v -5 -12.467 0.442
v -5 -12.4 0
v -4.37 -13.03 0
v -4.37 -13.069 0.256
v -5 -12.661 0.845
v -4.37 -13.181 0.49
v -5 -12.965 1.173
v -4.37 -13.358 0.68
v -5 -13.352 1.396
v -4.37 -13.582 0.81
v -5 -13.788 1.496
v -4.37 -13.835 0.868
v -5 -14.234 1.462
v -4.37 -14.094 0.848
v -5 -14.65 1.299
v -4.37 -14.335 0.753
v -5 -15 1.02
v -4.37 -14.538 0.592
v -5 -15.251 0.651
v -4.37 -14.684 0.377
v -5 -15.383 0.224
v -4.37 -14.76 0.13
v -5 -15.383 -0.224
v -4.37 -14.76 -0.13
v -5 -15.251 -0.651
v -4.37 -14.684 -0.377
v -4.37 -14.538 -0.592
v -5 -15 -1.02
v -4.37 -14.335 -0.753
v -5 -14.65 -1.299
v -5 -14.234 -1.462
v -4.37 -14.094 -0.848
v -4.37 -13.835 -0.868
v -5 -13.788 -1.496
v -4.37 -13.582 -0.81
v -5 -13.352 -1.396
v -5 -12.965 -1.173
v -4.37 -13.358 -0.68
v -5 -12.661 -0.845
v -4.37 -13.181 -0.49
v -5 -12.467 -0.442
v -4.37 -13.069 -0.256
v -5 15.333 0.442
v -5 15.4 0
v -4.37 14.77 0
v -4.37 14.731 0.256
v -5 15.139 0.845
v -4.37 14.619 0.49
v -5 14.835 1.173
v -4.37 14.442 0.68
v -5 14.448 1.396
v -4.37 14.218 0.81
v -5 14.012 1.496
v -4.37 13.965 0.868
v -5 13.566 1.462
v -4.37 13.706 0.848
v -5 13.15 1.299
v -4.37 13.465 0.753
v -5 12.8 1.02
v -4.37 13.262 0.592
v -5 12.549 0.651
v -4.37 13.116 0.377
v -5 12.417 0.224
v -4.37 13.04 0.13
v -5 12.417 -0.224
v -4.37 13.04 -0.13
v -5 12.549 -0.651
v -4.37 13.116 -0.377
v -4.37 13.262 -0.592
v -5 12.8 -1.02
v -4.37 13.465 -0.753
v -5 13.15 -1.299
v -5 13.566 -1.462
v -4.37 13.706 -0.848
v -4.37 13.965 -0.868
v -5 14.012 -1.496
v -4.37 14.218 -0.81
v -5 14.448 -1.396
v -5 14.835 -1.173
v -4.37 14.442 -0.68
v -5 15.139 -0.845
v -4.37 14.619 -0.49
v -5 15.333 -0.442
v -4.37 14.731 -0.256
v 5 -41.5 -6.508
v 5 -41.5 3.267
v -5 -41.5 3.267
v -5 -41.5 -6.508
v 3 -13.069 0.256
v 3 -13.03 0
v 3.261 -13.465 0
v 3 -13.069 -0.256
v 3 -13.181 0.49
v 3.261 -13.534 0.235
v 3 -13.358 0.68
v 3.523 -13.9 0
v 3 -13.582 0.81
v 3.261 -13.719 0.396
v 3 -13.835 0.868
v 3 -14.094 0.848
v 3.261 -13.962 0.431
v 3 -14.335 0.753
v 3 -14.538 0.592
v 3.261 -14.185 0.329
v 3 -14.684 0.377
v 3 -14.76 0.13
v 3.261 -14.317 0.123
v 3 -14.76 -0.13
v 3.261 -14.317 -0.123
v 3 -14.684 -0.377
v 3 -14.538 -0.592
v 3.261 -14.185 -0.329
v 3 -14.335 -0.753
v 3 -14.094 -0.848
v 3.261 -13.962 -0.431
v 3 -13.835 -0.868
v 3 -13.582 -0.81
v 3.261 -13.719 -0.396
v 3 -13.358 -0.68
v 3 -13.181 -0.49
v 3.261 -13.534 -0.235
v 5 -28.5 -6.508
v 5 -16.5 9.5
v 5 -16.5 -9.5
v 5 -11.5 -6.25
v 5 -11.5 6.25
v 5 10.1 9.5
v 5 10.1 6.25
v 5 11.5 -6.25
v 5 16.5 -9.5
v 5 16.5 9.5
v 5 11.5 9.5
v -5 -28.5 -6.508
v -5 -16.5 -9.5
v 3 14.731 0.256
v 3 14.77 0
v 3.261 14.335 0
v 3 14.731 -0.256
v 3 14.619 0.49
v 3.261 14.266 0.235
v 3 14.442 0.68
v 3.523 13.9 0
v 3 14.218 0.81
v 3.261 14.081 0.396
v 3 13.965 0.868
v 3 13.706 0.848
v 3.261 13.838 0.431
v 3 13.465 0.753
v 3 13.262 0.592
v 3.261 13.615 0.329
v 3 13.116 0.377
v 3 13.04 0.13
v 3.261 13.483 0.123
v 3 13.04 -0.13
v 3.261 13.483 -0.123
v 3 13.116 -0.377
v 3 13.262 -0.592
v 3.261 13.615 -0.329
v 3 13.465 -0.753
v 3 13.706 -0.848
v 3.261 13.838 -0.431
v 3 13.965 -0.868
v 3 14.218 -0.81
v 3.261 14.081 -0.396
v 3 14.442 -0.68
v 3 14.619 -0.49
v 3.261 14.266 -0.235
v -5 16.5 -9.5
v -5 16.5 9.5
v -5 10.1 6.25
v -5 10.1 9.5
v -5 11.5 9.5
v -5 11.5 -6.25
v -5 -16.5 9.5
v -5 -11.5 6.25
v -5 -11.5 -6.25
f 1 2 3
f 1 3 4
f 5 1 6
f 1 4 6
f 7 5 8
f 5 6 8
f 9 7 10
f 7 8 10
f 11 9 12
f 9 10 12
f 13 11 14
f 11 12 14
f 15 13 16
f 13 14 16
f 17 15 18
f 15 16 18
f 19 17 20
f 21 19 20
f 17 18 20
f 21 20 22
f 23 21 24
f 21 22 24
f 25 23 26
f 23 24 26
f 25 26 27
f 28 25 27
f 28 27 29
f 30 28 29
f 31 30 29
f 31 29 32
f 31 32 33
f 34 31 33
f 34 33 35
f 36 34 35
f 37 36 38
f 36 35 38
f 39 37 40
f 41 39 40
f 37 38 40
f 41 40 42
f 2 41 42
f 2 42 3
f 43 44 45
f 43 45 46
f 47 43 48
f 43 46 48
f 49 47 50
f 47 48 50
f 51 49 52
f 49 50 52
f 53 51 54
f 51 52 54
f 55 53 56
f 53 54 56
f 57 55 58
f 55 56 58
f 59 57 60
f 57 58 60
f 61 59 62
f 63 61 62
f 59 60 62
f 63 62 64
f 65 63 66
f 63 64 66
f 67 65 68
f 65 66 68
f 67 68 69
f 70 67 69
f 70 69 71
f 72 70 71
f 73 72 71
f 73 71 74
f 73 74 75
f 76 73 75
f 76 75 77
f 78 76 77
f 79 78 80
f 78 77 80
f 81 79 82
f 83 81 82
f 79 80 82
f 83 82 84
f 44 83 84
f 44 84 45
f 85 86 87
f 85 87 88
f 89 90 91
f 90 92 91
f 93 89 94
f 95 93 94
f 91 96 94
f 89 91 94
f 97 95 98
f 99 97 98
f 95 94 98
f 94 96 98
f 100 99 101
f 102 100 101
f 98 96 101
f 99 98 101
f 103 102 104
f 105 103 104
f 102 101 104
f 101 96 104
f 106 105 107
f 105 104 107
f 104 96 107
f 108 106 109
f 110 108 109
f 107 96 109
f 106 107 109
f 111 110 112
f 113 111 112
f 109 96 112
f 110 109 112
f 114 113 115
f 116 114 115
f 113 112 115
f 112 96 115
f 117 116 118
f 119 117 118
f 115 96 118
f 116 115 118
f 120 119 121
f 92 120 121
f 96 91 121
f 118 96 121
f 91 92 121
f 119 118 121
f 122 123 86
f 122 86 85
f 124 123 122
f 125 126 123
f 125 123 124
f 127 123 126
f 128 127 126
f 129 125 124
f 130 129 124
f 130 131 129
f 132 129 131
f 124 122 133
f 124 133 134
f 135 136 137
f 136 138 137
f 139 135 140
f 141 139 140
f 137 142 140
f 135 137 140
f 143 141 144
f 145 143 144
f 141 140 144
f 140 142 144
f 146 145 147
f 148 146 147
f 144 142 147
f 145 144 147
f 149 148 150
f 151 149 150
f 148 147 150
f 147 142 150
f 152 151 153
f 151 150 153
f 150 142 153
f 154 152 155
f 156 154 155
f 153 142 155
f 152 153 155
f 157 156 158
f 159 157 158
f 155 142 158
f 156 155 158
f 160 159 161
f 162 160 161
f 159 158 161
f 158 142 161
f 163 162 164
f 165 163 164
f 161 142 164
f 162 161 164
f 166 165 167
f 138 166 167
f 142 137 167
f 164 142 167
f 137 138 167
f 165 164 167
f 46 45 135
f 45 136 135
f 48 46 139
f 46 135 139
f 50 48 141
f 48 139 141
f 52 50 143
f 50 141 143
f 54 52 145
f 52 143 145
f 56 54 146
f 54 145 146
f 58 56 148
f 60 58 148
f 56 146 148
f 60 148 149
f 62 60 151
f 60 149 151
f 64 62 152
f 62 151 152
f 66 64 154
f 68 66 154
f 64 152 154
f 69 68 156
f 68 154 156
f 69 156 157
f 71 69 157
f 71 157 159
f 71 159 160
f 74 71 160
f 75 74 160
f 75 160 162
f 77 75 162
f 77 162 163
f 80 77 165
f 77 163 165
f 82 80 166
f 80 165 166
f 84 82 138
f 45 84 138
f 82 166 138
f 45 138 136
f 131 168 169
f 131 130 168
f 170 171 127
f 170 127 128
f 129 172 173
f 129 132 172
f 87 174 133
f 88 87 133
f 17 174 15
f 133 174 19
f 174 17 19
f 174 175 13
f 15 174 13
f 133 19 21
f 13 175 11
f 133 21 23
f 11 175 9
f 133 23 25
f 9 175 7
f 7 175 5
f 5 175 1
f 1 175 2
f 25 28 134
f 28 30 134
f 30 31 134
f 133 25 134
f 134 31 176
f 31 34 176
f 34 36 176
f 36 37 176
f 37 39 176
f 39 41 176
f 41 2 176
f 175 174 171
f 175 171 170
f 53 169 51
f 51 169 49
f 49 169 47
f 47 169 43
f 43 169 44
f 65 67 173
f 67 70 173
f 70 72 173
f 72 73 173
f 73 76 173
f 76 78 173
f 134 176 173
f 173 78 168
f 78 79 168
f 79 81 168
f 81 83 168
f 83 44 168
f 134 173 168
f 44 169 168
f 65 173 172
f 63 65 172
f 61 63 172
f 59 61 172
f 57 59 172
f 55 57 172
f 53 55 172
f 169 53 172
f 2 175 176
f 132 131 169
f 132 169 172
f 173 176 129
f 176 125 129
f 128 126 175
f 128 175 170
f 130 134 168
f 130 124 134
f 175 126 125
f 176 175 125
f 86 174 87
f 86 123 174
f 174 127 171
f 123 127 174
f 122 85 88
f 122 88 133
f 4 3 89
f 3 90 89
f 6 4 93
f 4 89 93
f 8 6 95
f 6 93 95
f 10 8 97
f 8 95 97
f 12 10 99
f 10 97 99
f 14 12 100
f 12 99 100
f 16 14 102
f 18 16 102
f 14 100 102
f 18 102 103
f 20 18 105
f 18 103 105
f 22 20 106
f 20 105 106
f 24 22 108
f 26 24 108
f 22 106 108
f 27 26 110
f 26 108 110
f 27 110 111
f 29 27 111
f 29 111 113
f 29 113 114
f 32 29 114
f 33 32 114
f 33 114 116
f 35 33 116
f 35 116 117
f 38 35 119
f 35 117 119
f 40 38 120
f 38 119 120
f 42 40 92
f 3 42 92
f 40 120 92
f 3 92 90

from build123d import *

# Parameters (mm, degrees)
SKETCH1_W           = 12.5
SKETCH1_H           = 23
BOSS_EXTRUDE1_DEPTH = 5
SKETCH4_W           = 3.25
SKETCH4_H           = 1.4
CUT_EXTRUDE1_DEPTH  = 44.732139211


# Read off the part's stored shape, not the designer's step: CSK for M2 Flat Head Machine Screw1
with BuildPart() as part:
    # Sketch1 → Boss-Extrude1 (new, symmetric)
    with BuildSketch(Plane(origin=(0, 0, 0), x_dir=(0, 0, -1), z_dir=(1, 0, 0))):
        Polygon((-9.5, -16.5), (-3.266799929, -41.5), (6.508063966, -41.5), (6.508063966, -28.5), (9.5, -16.5), (9.5, 16.5), (-9.5, 16.5), align=None)
        Rectangle(SKETCH1_W, SKETCH1_H, mode=Mode.SUBTRACT)
    extrude(amount=BOSS_EXTRUDE1_DEPTH, both=True)

    # CSK for M2 Flat Head Machine Screw1 outl → CSK for M2 Flat Head Machine Screw1 (revolve, cut)
    with BuildSketch(Plane(origin=(0, 13.9, 0), x_dir=(0, 1, 0), z_dir=(0, 0, -1))):
        Polygon((0.87, 3), (0, 3.522748739), (0, -5), (1.5, -5), (0.87, -4.37), align=None)
    revolve(axis=Axis((0, 13.9, 0), (1, 0, 0)), mode=Mode.SUBTRACT)

    # CSK for M2 Flat Head Machine Screw1 2 ou → CSK for M2 Flat Head Machine Screw1 2 (revolve, cut)
    with BuildSketch(Plane(origin=(0, -13.9, 0), x_dir=(0, 1, 0), z_dir=(0, 0, -1))):
        Polygon((0.87, 3), (0, 3.522748739), (0, -5), (1.5, -5), (0.87, -4.37), align=None)
    revolve(axis=Axis((0, -13.9, 0), (1, 0, 0)), mode=Mode.SUBTRACT)

    # Sketch4 → Cut-Extrude1 (cut, through all)
    with BuildSketch(Plane(origin=(5, 0, 0), x_dir=(0, 0, -1), z_dir=(1, 0, 0))):
        with Locations((-7.875, 10.8)):
            Rectangle(SKETCH4_W, SKETCH4_H)
    extrude(amount=-CUT_EXTRUDE1_DEPTH, mode=Mode.SUBTRACT)


solid = part.part
